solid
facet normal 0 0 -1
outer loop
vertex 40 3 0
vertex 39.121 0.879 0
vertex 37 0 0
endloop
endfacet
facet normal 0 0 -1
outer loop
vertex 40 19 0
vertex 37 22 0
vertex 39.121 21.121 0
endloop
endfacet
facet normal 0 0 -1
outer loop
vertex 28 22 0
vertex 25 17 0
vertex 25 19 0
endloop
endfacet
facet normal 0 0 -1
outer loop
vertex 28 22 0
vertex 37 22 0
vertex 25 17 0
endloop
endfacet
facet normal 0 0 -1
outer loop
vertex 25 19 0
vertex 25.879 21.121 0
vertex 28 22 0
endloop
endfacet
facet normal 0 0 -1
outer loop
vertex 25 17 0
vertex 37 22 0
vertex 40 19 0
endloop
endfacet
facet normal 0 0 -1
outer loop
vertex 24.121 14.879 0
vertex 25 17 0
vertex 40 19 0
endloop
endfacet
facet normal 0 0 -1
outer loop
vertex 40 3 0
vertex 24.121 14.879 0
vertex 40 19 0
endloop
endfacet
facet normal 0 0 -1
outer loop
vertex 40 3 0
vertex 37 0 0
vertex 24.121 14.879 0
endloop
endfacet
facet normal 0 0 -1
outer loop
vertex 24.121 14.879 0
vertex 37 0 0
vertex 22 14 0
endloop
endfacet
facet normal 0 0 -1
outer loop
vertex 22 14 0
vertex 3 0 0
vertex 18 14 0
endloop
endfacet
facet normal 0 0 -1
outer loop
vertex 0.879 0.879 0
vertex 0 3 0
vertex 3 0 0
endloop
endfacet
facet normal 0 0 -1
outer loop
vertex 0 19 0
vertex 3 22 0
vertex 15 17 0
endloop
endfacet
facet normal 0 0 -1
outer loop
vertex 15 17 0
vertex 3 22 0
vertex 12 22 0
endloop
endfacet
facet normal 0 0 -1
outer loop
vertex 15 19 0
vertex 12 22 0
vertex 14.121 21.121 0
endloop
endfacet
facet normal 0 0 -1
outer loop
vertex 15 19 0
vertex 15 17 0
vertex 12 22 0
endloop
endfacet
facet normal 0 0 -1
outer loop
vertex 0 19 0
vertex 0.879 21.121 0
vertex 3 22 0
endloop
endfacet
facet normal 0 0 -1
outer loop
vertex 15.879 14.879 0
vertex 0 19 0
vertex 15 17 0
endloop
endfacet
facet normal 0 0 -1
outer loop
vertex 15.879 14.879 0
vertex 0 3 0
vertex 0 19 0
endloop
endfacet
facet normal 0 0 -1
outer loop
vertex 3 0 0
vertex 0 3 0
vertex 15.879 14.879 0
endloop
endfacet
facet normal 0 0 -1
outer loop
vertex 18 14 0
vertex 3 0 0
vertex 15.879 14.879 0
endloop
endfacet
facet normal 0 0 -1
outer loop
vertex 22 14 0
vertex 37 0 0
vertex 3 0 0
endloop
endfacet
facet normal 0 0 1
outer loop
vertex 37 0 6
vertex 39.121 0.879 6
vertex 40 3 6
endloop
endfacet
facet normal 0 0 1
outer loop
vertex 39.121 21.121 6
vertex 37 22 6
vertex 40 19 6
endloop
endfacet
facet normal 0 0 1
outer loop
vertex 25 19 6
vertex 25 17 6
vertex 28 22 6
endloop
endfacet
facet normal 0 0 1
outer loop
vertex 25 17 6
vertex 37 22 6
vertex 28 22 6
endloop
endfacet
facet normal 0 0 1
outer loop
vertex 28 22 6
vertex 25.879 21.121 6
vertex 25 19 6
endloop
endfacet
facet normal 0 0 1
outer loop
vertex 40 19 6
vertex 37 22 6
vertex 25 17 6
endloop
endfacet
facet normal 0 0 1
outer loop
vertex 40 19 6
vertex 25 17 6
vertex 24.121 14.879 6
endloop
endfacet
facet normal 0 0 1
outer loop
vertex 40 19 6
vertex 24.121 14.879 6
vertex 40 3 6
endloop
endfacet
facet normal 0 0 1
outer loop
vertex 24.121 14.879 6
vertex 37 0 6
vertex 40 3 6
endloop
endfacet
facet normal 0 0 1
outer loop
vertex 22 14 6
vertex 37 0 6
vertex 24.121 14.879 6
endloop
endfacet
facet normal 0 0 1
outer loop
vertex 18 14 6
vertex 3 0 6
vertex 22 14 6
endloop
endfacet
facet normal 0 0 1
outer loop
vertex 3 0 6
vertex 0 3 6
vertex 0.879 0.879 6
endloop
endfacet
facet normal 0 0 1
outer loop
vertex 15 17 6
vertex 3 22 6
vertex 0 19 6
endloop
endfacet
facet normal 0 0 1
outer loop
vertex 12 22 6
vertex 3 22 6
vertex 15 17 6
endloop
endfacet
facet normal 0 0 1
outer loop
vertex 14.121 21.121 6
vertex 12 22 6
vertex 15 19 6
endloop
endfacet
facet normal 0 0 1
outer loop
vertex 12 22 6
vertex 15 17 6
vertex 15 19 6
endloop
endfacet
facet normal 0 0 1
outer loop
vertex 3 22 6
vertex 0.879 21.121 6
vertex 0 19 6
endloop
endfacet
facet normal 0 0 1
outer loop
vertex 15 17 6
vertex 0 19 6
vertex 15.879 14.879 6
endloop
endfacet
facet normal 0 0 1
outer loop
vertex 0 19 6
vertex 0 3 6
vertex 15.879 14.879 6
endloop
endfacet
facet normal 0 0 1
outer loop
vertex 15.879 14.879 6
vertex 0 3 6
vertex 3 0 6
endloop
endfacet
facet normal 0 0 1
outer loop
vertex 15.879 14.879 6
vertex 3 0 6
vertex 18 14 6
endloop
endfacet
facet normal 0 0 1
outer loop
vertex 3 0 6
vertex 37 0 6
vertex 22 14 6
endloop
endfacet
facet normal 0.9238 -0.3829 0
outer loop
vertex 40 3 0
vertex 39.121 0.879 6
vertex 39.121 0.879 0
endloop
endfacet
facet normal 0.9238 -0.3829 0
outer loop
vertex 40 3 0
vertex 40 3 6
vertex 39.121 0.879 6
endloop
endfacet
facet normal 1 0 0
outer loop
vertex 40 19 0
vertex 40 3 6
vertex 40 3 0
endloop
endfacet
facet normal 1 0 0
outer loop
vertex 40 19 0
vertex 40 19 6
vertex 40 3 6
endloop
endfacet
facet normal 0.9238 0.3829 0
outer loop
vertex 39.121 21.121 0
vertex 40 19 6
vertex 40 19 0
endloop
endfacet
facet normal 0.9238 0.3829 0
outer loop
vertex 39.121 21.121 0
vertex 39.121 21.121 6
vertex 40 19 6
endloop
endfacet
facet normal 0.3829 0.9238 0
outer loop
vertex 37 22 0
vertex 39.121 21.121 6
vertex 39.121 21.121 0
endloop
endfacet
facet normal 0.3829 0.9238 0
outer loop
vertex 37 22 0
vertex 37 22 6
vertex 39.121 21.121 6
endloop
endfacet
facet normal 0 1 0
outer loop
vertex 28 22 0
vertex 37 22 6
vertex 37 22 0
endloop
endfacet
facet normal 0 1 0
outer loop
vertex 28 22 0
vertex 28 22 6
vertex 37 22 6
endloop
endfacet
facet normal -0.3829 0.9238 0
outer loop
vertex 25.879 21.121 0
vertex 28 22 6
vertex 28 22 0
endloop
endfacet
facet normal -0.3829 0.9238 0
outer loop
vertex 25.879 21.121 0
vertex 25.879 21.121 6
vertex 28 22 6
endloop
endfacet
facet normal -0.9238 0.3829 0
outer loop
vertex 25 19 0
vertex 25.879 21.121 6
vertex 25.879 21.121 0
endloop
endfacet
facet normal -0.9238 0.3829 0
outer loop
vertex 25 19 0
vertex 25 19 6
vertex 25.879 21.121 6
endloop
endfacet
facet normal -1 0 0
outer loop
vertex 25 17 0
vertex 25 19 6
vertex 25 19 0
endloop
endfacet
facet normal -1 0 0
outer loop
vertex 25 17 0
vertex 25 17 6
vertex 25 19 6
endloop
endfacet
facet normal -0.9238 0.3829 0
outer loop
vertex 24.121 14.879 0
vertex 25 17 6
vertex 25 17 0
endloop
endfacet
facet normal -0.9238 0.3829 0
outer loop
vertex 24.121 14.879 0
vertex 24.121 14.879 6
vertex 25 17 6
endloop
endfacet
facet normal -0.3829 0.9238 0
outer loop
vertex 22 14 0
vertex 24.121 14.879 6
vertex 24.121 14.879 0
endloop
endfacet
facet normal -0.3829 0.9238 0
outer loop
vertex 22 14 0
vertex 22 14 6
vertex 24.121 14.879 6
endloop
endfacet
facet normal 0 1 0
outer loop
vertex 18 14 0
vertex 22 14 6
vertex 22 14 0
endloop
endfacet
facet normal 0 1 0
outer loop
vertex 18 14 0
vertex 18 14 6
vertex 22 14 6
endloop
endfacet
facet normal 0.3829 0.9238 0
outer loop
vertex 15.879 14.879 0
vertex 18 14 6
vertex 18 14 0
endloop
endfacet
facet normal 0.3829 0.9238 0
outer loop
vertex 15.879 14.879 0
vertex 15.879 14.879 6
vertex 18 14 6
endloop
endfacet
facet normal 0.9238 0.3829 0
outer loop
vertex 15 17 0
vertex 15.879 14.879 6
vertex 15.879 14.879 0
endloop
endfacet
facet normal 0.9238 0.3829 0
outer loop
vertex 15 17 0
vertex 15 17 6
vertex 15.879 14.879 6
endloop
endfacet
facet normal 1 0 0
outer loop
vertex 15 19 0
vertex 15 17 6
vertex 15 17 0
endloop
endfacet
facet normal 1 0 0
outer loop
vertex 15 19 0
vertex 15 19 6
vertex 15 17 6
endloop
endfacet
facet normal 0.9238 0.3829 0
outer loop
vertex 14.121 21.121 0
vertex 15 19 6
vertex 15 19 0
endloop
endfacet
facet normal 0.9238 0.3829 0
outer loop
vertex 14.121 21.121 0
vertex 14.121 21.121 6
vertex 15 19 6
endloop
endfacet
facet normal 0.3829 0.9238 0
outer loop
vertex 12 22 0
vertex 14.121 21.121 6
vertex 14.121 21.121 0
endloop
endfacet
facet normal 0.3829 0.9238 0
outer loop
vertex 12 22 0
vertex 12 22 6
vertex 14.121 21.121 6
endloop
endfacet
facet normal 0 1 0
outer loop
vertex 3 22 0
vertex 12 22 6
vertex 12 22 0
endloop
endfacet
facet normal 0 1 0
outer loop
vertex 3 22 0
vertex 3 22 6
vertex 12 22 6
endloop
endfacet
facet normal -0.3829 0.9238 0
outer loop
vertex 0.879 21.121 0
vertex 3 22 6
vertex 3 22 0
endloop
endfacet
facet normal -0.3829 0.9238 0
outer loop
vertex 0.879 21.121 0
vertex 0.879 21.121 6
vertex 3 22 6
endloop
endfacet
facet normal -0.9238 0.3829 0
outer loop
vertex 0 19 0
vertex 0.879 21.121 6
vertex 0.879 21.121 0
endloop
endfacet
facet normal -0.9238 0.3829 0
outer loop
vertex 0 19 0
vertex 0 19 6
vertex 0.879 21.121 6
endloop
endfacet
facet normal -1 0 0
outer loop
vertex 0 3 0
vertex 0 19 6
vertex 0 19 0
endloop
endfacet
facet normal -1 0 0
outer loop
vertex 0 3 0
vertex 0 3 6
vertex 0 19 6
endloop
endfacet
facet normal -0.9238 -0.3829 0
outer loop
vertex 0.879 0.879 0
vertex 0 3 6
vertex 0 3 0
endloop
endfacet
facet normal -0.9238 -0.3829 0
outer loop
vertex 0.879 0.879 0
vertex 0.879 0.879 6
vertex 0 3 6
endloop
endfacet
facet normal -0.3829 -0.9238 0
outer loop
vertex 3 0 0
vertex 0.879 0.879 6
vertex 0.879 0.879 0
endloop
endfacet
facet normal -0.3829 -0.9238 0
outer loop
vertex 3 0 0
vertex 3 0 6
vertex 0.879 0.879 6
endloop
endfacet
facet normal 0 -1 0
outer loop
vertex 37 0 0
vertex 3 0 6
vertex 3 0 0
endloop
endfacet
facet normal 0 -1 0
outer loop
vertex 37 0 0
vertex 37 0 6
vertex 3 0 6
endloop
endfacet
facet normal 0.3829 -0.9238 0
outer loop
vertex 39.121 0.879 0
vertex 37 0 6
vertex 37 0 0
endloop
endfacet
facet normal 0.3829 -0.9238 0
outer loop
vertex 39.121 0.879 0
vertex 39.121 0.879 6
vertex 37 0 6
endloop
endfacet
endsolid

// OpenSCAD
$fn = 32;

// ----------------------------------------------------------------------
// Eye lug: clevis, 6 mm thick
// ----------------------------------------------------------------------

// --- parameters (mm) ---
profile_height = 6;       // extrusion height
profile_points = 24;      // points of the closed outline

profile = [[0, 3], [0.879, 0.879], [3, 0], [37, 0], [39.121, 0.879], [40, 3], [40, 19], [39.121, 21.121], [37, 22], [28, 22], [25.879, 21.121], [25, 19], [25, 17], [24.121, 14.879], [22, 14], [18, 14], [15.879, 14.879], [15, 17], [15, 19], [14.121, 21.121], [12, 22], [3, 22], [0.879, 21.121], [0, 19]];  // single closed polygon, 24 points, counter clockwise

// --- the one profile operation ---
linear_extrude(height = profile_height) polygon(points = profile);
